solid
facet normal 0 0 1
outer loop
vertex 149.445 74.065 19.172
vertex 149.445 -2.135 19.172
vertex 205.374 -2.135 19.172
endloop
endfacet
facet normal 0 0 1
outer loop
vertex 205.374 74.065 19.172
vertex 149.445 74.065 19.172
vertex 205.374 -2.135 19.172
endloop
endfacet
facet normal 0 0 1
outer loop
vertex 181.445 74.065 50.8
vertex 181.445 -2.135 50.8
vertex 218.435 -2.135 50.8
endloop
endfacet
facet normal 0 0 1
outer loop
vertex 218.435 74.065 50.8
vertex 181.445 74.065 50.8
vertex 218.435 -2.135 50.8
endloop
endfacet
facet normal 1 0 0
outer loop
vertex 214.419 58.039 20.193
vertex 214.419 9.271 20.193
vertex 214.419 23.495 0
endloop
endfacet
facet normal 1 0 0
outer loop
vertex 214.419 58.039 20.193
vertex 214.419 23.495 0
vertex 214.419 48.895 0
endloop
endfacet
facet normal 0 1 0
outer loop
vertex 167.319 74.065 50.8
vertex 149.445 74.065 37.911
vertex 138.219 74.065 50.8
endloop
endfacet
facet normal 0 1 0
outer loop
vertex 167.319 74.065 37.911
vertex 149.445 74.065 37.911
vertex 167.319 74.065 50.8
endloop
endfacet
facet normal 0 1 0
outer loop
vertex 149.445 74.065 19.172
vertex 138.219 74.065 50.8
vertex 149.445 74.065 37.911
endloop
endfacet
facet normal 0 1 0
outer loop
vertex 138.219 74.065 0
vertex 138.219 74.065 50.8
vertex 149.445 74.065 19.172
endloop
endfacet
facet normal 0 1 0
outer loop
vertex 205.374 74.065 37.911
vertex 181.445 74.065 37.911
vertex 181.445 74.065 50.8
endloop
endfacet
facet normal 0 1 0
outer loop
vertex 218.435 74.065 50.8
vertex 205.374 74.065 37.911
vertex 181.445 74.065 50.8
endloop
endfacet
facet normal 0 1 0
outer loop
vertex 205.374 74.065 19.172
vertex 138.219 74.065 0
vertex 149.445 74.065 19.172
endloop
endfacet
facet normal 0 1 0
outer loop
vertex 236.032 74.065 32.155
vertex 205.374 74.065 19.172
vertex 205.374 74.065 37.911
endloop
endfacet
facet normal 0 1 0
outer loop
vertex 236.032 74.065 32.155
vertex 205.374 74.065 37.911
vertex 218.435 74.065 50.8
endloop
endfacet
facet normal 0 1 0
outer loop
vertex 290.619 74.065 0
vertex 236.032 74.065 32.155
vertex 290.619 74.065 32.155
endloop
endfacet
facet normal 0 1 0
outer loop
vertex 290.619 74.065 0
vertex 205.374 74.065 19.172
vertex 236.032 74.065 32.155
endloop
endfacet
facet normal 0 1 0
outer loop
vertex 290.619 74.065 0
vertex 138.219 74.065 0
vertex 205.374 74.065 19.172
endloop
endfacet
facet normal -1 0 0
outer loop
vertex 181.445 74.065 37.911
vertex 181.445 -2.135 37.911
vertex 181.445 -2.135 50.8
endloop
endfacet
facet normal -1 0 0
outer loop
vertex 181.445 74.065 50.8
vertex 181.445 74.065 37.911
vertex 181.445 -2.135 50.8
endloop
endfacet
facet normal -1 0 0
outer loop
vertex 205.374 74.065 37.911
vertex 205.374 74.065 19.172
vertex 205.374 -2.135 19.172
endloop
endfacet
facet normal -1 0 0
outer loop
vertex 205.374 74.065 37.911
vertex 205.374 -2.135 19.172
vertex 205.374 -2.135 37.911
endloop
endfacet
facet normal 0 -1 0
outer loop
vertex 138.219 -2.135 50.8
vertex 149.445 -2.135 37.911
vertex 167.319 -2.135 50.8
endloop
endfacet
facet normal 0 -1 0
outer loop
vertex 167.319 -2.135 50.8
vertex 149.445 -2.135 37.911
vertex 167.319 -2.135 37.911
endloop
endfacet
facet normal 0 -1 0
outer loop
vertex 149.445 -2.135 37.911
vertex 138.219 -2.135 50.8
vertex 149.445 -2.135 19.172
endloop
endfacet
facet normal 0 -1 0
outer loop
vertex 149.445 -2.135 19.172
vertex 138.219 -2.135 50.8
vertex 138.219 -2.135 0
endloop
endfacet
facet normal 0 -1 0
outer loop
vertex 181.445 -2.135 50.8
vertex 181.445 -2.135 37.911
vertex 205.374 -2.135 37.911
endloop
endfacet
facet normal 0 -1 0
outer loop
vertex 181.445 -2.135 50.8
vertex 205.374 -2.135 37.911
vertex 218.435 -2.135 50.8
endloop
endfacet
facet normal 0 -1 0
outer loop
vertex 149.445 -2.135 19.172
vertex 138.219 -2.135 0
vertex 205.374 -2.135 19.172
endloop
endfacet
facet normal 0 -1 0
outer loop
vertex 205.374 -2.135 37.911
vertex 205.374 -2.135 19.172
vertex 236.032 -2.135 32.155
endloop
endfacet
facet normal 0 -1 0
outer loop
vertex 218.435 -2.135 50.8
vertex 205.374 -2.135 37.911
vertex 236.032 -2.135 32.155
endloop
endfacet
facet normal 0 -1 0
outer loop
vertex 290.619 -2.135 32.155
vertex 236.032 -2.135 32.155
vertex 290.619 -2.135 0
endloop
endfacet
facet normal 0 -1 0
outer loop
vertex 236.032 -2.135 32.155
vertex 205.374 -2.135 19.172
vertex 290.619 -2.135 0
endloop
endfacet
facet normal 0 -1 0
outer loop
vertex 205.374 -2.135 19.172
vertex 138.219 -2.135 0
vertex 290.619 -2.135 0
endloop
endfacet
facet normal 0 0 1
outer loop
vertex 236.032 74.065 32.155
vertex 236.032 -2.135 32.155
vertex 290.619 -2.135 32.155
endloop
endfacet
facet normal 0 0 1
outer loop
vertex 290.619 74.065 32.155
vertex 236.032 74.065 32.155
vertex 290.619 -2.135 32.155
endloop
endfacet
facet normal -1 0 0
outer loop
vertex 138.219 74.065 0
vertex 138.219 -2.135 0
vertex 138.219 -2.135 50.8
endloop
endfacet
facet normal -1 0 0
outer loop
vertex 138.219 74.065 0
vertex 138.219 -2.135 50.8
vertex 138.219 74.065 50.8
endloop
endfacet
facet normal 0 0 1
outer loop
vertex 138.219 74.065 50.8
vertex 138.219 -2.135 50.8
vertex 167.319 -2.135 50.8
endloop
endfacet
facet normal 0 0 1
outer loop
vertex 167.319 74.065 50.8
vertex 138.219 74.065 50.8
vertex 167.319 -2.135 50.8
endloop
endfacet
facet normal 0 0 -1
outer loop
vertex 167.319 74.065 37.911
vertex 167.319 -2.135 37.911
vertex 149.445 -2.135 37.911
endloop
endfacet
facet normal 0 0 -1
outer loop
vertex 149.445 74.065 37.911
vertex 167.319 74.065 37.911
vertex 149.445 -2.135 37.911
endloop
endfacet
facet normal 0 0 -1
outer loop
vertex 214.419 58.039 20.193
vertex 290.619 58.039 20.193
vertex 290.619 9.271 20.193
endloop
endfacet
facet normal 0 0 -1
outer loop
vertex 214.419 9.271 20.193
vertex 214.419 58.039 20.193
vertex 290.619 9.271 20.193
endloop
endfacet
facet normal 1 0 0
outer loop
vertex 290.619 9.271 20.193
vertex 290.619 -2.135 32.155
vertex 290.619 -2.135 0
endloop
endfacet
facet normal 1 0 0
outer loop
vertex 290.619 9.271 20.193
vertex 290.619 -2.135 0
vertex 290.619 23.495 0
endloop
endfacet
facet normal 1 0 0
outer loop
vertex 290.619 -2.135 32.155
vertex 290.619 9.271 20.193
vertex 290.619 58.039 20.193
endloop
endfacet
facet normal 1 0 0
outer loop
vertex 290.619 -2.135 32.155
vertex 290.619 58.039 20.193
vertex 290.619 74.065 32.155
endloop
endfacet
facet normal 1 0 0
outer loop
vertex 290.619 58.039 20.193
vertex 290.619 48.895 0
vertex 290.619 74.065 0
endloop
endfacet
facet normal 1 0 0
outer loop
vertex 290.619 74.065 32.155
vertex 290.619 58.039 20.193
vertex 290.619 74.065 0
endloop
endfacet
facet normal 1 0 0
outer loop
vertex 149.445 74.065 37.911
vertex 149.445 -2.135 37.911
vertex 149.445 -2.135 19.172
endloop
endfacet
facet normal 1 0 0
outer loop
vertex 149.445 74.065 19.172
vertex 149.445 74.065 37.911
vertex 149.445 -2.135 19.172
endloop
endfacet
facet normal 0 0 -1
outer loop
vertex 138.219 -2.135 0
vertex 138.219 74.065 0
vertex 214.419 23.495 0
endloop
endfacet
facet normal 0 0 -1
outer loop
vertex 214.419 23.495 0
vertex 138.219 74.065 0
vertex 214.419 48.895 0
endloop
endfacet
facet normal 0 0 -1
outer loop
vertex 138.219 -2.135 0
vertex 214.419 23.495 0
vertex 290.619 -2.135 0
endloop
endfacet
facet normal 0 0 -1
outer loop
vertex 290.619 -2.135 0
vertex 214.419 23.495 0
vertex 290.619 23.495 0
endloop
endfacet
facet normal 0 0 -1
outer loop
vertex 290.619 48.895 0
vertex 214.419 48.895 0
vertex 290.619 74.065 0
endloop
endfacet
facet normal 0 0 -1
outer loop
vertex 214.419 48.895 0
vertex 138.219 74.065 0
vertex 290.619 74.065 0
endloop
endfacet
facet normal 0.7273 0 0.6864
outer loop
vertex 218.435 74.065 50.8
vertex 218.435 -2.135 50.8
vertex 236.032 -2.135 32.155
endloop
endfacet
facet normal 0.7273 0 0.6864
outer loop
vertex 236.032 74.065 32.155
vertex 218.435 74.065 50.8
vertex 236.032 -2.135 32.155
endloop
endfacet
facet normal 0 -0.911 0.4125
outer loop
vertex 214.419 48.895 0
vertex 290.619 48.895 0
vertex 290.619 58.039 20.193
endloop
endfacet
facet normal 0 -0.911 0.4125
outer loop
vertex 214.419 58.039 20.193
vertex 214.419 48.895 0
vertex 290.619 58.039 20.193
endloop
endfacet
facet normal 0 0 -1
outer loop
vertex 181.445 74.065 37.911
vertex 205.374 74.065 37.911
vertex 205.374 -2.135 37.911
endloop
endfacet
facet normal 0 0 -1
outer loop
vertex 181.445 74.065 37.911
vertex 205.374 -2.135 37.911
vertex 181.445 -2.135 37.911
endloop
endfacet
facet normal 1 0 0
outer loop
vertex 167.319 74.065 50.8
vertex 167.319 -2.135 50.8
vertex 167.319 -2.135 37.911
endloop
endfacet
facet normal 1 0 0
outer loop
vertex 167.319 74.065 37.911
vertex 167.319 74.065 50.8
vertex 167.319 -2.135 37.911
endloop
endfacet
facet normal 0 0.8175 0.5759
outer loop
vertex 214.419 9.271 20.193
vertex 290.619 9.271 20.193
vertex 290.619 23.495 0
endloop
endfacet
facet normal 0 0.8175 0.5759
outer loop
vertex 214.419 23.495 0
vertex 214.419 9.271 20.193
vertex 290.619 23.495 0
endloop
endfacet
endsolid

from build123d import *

# Parameters (mm, degrees)
F0_W     = 152.4
F0_H     = 76.2
F1_DEPTH = 50.8
F3_DEPTH = 76.2
F5_DEPTH = 76.2
F7_DEPTH = 76.2


with BuildPart() as f1:
    # F0 (on Top) → F1 (new body)
    with BuildSketch(Plane.XY):
        with Locations((214.419328, 35.965416)):
            Rectangle(F0_W, F0_H)
    extrude(amount=F1_DEPTH)

    # F2 (on face) → F3 (cut)
    with BuildSketch(Plane.XZ.offset(2.134584)):
        Polygon((181.445256, 50.8), (167.318881, 50.8), (167.318881, 37.91061), (149.444669, 37.91061), (149.444669, 19.171527), (205.37363, 19.171527), (205.37363, 37.91061), (181.445256, 37.91061), align=None)
    extrude(amount=-F3_DEPTH, mode=Mode.SUBTRACT)

    # F4 (on face) → F5 (cut)
    with BuildSketch(Plane.XZ.offset(2.134584)):
        Polygon((290.619328, 50.8), (218.435228, 50.8), (236.032292, 32.15526), (290.619328, 32.15526), align=None)
    extrude(amount=-F5_DEPTH, mode=Mode.SUBTRACT)

    # F6 (on face) → F7 (cut)
    with BuildSketch(Plane.YZ.offset(290.619328)):
        Polygon((9.271001, 20.193001), (23.494998, 0), (48.895001, 0), (58.039002, 20.193001), align=None)
    extrude(amount=-F7_DEPTH, mode=Mode.SUBTRACT)


solid = f1.part
